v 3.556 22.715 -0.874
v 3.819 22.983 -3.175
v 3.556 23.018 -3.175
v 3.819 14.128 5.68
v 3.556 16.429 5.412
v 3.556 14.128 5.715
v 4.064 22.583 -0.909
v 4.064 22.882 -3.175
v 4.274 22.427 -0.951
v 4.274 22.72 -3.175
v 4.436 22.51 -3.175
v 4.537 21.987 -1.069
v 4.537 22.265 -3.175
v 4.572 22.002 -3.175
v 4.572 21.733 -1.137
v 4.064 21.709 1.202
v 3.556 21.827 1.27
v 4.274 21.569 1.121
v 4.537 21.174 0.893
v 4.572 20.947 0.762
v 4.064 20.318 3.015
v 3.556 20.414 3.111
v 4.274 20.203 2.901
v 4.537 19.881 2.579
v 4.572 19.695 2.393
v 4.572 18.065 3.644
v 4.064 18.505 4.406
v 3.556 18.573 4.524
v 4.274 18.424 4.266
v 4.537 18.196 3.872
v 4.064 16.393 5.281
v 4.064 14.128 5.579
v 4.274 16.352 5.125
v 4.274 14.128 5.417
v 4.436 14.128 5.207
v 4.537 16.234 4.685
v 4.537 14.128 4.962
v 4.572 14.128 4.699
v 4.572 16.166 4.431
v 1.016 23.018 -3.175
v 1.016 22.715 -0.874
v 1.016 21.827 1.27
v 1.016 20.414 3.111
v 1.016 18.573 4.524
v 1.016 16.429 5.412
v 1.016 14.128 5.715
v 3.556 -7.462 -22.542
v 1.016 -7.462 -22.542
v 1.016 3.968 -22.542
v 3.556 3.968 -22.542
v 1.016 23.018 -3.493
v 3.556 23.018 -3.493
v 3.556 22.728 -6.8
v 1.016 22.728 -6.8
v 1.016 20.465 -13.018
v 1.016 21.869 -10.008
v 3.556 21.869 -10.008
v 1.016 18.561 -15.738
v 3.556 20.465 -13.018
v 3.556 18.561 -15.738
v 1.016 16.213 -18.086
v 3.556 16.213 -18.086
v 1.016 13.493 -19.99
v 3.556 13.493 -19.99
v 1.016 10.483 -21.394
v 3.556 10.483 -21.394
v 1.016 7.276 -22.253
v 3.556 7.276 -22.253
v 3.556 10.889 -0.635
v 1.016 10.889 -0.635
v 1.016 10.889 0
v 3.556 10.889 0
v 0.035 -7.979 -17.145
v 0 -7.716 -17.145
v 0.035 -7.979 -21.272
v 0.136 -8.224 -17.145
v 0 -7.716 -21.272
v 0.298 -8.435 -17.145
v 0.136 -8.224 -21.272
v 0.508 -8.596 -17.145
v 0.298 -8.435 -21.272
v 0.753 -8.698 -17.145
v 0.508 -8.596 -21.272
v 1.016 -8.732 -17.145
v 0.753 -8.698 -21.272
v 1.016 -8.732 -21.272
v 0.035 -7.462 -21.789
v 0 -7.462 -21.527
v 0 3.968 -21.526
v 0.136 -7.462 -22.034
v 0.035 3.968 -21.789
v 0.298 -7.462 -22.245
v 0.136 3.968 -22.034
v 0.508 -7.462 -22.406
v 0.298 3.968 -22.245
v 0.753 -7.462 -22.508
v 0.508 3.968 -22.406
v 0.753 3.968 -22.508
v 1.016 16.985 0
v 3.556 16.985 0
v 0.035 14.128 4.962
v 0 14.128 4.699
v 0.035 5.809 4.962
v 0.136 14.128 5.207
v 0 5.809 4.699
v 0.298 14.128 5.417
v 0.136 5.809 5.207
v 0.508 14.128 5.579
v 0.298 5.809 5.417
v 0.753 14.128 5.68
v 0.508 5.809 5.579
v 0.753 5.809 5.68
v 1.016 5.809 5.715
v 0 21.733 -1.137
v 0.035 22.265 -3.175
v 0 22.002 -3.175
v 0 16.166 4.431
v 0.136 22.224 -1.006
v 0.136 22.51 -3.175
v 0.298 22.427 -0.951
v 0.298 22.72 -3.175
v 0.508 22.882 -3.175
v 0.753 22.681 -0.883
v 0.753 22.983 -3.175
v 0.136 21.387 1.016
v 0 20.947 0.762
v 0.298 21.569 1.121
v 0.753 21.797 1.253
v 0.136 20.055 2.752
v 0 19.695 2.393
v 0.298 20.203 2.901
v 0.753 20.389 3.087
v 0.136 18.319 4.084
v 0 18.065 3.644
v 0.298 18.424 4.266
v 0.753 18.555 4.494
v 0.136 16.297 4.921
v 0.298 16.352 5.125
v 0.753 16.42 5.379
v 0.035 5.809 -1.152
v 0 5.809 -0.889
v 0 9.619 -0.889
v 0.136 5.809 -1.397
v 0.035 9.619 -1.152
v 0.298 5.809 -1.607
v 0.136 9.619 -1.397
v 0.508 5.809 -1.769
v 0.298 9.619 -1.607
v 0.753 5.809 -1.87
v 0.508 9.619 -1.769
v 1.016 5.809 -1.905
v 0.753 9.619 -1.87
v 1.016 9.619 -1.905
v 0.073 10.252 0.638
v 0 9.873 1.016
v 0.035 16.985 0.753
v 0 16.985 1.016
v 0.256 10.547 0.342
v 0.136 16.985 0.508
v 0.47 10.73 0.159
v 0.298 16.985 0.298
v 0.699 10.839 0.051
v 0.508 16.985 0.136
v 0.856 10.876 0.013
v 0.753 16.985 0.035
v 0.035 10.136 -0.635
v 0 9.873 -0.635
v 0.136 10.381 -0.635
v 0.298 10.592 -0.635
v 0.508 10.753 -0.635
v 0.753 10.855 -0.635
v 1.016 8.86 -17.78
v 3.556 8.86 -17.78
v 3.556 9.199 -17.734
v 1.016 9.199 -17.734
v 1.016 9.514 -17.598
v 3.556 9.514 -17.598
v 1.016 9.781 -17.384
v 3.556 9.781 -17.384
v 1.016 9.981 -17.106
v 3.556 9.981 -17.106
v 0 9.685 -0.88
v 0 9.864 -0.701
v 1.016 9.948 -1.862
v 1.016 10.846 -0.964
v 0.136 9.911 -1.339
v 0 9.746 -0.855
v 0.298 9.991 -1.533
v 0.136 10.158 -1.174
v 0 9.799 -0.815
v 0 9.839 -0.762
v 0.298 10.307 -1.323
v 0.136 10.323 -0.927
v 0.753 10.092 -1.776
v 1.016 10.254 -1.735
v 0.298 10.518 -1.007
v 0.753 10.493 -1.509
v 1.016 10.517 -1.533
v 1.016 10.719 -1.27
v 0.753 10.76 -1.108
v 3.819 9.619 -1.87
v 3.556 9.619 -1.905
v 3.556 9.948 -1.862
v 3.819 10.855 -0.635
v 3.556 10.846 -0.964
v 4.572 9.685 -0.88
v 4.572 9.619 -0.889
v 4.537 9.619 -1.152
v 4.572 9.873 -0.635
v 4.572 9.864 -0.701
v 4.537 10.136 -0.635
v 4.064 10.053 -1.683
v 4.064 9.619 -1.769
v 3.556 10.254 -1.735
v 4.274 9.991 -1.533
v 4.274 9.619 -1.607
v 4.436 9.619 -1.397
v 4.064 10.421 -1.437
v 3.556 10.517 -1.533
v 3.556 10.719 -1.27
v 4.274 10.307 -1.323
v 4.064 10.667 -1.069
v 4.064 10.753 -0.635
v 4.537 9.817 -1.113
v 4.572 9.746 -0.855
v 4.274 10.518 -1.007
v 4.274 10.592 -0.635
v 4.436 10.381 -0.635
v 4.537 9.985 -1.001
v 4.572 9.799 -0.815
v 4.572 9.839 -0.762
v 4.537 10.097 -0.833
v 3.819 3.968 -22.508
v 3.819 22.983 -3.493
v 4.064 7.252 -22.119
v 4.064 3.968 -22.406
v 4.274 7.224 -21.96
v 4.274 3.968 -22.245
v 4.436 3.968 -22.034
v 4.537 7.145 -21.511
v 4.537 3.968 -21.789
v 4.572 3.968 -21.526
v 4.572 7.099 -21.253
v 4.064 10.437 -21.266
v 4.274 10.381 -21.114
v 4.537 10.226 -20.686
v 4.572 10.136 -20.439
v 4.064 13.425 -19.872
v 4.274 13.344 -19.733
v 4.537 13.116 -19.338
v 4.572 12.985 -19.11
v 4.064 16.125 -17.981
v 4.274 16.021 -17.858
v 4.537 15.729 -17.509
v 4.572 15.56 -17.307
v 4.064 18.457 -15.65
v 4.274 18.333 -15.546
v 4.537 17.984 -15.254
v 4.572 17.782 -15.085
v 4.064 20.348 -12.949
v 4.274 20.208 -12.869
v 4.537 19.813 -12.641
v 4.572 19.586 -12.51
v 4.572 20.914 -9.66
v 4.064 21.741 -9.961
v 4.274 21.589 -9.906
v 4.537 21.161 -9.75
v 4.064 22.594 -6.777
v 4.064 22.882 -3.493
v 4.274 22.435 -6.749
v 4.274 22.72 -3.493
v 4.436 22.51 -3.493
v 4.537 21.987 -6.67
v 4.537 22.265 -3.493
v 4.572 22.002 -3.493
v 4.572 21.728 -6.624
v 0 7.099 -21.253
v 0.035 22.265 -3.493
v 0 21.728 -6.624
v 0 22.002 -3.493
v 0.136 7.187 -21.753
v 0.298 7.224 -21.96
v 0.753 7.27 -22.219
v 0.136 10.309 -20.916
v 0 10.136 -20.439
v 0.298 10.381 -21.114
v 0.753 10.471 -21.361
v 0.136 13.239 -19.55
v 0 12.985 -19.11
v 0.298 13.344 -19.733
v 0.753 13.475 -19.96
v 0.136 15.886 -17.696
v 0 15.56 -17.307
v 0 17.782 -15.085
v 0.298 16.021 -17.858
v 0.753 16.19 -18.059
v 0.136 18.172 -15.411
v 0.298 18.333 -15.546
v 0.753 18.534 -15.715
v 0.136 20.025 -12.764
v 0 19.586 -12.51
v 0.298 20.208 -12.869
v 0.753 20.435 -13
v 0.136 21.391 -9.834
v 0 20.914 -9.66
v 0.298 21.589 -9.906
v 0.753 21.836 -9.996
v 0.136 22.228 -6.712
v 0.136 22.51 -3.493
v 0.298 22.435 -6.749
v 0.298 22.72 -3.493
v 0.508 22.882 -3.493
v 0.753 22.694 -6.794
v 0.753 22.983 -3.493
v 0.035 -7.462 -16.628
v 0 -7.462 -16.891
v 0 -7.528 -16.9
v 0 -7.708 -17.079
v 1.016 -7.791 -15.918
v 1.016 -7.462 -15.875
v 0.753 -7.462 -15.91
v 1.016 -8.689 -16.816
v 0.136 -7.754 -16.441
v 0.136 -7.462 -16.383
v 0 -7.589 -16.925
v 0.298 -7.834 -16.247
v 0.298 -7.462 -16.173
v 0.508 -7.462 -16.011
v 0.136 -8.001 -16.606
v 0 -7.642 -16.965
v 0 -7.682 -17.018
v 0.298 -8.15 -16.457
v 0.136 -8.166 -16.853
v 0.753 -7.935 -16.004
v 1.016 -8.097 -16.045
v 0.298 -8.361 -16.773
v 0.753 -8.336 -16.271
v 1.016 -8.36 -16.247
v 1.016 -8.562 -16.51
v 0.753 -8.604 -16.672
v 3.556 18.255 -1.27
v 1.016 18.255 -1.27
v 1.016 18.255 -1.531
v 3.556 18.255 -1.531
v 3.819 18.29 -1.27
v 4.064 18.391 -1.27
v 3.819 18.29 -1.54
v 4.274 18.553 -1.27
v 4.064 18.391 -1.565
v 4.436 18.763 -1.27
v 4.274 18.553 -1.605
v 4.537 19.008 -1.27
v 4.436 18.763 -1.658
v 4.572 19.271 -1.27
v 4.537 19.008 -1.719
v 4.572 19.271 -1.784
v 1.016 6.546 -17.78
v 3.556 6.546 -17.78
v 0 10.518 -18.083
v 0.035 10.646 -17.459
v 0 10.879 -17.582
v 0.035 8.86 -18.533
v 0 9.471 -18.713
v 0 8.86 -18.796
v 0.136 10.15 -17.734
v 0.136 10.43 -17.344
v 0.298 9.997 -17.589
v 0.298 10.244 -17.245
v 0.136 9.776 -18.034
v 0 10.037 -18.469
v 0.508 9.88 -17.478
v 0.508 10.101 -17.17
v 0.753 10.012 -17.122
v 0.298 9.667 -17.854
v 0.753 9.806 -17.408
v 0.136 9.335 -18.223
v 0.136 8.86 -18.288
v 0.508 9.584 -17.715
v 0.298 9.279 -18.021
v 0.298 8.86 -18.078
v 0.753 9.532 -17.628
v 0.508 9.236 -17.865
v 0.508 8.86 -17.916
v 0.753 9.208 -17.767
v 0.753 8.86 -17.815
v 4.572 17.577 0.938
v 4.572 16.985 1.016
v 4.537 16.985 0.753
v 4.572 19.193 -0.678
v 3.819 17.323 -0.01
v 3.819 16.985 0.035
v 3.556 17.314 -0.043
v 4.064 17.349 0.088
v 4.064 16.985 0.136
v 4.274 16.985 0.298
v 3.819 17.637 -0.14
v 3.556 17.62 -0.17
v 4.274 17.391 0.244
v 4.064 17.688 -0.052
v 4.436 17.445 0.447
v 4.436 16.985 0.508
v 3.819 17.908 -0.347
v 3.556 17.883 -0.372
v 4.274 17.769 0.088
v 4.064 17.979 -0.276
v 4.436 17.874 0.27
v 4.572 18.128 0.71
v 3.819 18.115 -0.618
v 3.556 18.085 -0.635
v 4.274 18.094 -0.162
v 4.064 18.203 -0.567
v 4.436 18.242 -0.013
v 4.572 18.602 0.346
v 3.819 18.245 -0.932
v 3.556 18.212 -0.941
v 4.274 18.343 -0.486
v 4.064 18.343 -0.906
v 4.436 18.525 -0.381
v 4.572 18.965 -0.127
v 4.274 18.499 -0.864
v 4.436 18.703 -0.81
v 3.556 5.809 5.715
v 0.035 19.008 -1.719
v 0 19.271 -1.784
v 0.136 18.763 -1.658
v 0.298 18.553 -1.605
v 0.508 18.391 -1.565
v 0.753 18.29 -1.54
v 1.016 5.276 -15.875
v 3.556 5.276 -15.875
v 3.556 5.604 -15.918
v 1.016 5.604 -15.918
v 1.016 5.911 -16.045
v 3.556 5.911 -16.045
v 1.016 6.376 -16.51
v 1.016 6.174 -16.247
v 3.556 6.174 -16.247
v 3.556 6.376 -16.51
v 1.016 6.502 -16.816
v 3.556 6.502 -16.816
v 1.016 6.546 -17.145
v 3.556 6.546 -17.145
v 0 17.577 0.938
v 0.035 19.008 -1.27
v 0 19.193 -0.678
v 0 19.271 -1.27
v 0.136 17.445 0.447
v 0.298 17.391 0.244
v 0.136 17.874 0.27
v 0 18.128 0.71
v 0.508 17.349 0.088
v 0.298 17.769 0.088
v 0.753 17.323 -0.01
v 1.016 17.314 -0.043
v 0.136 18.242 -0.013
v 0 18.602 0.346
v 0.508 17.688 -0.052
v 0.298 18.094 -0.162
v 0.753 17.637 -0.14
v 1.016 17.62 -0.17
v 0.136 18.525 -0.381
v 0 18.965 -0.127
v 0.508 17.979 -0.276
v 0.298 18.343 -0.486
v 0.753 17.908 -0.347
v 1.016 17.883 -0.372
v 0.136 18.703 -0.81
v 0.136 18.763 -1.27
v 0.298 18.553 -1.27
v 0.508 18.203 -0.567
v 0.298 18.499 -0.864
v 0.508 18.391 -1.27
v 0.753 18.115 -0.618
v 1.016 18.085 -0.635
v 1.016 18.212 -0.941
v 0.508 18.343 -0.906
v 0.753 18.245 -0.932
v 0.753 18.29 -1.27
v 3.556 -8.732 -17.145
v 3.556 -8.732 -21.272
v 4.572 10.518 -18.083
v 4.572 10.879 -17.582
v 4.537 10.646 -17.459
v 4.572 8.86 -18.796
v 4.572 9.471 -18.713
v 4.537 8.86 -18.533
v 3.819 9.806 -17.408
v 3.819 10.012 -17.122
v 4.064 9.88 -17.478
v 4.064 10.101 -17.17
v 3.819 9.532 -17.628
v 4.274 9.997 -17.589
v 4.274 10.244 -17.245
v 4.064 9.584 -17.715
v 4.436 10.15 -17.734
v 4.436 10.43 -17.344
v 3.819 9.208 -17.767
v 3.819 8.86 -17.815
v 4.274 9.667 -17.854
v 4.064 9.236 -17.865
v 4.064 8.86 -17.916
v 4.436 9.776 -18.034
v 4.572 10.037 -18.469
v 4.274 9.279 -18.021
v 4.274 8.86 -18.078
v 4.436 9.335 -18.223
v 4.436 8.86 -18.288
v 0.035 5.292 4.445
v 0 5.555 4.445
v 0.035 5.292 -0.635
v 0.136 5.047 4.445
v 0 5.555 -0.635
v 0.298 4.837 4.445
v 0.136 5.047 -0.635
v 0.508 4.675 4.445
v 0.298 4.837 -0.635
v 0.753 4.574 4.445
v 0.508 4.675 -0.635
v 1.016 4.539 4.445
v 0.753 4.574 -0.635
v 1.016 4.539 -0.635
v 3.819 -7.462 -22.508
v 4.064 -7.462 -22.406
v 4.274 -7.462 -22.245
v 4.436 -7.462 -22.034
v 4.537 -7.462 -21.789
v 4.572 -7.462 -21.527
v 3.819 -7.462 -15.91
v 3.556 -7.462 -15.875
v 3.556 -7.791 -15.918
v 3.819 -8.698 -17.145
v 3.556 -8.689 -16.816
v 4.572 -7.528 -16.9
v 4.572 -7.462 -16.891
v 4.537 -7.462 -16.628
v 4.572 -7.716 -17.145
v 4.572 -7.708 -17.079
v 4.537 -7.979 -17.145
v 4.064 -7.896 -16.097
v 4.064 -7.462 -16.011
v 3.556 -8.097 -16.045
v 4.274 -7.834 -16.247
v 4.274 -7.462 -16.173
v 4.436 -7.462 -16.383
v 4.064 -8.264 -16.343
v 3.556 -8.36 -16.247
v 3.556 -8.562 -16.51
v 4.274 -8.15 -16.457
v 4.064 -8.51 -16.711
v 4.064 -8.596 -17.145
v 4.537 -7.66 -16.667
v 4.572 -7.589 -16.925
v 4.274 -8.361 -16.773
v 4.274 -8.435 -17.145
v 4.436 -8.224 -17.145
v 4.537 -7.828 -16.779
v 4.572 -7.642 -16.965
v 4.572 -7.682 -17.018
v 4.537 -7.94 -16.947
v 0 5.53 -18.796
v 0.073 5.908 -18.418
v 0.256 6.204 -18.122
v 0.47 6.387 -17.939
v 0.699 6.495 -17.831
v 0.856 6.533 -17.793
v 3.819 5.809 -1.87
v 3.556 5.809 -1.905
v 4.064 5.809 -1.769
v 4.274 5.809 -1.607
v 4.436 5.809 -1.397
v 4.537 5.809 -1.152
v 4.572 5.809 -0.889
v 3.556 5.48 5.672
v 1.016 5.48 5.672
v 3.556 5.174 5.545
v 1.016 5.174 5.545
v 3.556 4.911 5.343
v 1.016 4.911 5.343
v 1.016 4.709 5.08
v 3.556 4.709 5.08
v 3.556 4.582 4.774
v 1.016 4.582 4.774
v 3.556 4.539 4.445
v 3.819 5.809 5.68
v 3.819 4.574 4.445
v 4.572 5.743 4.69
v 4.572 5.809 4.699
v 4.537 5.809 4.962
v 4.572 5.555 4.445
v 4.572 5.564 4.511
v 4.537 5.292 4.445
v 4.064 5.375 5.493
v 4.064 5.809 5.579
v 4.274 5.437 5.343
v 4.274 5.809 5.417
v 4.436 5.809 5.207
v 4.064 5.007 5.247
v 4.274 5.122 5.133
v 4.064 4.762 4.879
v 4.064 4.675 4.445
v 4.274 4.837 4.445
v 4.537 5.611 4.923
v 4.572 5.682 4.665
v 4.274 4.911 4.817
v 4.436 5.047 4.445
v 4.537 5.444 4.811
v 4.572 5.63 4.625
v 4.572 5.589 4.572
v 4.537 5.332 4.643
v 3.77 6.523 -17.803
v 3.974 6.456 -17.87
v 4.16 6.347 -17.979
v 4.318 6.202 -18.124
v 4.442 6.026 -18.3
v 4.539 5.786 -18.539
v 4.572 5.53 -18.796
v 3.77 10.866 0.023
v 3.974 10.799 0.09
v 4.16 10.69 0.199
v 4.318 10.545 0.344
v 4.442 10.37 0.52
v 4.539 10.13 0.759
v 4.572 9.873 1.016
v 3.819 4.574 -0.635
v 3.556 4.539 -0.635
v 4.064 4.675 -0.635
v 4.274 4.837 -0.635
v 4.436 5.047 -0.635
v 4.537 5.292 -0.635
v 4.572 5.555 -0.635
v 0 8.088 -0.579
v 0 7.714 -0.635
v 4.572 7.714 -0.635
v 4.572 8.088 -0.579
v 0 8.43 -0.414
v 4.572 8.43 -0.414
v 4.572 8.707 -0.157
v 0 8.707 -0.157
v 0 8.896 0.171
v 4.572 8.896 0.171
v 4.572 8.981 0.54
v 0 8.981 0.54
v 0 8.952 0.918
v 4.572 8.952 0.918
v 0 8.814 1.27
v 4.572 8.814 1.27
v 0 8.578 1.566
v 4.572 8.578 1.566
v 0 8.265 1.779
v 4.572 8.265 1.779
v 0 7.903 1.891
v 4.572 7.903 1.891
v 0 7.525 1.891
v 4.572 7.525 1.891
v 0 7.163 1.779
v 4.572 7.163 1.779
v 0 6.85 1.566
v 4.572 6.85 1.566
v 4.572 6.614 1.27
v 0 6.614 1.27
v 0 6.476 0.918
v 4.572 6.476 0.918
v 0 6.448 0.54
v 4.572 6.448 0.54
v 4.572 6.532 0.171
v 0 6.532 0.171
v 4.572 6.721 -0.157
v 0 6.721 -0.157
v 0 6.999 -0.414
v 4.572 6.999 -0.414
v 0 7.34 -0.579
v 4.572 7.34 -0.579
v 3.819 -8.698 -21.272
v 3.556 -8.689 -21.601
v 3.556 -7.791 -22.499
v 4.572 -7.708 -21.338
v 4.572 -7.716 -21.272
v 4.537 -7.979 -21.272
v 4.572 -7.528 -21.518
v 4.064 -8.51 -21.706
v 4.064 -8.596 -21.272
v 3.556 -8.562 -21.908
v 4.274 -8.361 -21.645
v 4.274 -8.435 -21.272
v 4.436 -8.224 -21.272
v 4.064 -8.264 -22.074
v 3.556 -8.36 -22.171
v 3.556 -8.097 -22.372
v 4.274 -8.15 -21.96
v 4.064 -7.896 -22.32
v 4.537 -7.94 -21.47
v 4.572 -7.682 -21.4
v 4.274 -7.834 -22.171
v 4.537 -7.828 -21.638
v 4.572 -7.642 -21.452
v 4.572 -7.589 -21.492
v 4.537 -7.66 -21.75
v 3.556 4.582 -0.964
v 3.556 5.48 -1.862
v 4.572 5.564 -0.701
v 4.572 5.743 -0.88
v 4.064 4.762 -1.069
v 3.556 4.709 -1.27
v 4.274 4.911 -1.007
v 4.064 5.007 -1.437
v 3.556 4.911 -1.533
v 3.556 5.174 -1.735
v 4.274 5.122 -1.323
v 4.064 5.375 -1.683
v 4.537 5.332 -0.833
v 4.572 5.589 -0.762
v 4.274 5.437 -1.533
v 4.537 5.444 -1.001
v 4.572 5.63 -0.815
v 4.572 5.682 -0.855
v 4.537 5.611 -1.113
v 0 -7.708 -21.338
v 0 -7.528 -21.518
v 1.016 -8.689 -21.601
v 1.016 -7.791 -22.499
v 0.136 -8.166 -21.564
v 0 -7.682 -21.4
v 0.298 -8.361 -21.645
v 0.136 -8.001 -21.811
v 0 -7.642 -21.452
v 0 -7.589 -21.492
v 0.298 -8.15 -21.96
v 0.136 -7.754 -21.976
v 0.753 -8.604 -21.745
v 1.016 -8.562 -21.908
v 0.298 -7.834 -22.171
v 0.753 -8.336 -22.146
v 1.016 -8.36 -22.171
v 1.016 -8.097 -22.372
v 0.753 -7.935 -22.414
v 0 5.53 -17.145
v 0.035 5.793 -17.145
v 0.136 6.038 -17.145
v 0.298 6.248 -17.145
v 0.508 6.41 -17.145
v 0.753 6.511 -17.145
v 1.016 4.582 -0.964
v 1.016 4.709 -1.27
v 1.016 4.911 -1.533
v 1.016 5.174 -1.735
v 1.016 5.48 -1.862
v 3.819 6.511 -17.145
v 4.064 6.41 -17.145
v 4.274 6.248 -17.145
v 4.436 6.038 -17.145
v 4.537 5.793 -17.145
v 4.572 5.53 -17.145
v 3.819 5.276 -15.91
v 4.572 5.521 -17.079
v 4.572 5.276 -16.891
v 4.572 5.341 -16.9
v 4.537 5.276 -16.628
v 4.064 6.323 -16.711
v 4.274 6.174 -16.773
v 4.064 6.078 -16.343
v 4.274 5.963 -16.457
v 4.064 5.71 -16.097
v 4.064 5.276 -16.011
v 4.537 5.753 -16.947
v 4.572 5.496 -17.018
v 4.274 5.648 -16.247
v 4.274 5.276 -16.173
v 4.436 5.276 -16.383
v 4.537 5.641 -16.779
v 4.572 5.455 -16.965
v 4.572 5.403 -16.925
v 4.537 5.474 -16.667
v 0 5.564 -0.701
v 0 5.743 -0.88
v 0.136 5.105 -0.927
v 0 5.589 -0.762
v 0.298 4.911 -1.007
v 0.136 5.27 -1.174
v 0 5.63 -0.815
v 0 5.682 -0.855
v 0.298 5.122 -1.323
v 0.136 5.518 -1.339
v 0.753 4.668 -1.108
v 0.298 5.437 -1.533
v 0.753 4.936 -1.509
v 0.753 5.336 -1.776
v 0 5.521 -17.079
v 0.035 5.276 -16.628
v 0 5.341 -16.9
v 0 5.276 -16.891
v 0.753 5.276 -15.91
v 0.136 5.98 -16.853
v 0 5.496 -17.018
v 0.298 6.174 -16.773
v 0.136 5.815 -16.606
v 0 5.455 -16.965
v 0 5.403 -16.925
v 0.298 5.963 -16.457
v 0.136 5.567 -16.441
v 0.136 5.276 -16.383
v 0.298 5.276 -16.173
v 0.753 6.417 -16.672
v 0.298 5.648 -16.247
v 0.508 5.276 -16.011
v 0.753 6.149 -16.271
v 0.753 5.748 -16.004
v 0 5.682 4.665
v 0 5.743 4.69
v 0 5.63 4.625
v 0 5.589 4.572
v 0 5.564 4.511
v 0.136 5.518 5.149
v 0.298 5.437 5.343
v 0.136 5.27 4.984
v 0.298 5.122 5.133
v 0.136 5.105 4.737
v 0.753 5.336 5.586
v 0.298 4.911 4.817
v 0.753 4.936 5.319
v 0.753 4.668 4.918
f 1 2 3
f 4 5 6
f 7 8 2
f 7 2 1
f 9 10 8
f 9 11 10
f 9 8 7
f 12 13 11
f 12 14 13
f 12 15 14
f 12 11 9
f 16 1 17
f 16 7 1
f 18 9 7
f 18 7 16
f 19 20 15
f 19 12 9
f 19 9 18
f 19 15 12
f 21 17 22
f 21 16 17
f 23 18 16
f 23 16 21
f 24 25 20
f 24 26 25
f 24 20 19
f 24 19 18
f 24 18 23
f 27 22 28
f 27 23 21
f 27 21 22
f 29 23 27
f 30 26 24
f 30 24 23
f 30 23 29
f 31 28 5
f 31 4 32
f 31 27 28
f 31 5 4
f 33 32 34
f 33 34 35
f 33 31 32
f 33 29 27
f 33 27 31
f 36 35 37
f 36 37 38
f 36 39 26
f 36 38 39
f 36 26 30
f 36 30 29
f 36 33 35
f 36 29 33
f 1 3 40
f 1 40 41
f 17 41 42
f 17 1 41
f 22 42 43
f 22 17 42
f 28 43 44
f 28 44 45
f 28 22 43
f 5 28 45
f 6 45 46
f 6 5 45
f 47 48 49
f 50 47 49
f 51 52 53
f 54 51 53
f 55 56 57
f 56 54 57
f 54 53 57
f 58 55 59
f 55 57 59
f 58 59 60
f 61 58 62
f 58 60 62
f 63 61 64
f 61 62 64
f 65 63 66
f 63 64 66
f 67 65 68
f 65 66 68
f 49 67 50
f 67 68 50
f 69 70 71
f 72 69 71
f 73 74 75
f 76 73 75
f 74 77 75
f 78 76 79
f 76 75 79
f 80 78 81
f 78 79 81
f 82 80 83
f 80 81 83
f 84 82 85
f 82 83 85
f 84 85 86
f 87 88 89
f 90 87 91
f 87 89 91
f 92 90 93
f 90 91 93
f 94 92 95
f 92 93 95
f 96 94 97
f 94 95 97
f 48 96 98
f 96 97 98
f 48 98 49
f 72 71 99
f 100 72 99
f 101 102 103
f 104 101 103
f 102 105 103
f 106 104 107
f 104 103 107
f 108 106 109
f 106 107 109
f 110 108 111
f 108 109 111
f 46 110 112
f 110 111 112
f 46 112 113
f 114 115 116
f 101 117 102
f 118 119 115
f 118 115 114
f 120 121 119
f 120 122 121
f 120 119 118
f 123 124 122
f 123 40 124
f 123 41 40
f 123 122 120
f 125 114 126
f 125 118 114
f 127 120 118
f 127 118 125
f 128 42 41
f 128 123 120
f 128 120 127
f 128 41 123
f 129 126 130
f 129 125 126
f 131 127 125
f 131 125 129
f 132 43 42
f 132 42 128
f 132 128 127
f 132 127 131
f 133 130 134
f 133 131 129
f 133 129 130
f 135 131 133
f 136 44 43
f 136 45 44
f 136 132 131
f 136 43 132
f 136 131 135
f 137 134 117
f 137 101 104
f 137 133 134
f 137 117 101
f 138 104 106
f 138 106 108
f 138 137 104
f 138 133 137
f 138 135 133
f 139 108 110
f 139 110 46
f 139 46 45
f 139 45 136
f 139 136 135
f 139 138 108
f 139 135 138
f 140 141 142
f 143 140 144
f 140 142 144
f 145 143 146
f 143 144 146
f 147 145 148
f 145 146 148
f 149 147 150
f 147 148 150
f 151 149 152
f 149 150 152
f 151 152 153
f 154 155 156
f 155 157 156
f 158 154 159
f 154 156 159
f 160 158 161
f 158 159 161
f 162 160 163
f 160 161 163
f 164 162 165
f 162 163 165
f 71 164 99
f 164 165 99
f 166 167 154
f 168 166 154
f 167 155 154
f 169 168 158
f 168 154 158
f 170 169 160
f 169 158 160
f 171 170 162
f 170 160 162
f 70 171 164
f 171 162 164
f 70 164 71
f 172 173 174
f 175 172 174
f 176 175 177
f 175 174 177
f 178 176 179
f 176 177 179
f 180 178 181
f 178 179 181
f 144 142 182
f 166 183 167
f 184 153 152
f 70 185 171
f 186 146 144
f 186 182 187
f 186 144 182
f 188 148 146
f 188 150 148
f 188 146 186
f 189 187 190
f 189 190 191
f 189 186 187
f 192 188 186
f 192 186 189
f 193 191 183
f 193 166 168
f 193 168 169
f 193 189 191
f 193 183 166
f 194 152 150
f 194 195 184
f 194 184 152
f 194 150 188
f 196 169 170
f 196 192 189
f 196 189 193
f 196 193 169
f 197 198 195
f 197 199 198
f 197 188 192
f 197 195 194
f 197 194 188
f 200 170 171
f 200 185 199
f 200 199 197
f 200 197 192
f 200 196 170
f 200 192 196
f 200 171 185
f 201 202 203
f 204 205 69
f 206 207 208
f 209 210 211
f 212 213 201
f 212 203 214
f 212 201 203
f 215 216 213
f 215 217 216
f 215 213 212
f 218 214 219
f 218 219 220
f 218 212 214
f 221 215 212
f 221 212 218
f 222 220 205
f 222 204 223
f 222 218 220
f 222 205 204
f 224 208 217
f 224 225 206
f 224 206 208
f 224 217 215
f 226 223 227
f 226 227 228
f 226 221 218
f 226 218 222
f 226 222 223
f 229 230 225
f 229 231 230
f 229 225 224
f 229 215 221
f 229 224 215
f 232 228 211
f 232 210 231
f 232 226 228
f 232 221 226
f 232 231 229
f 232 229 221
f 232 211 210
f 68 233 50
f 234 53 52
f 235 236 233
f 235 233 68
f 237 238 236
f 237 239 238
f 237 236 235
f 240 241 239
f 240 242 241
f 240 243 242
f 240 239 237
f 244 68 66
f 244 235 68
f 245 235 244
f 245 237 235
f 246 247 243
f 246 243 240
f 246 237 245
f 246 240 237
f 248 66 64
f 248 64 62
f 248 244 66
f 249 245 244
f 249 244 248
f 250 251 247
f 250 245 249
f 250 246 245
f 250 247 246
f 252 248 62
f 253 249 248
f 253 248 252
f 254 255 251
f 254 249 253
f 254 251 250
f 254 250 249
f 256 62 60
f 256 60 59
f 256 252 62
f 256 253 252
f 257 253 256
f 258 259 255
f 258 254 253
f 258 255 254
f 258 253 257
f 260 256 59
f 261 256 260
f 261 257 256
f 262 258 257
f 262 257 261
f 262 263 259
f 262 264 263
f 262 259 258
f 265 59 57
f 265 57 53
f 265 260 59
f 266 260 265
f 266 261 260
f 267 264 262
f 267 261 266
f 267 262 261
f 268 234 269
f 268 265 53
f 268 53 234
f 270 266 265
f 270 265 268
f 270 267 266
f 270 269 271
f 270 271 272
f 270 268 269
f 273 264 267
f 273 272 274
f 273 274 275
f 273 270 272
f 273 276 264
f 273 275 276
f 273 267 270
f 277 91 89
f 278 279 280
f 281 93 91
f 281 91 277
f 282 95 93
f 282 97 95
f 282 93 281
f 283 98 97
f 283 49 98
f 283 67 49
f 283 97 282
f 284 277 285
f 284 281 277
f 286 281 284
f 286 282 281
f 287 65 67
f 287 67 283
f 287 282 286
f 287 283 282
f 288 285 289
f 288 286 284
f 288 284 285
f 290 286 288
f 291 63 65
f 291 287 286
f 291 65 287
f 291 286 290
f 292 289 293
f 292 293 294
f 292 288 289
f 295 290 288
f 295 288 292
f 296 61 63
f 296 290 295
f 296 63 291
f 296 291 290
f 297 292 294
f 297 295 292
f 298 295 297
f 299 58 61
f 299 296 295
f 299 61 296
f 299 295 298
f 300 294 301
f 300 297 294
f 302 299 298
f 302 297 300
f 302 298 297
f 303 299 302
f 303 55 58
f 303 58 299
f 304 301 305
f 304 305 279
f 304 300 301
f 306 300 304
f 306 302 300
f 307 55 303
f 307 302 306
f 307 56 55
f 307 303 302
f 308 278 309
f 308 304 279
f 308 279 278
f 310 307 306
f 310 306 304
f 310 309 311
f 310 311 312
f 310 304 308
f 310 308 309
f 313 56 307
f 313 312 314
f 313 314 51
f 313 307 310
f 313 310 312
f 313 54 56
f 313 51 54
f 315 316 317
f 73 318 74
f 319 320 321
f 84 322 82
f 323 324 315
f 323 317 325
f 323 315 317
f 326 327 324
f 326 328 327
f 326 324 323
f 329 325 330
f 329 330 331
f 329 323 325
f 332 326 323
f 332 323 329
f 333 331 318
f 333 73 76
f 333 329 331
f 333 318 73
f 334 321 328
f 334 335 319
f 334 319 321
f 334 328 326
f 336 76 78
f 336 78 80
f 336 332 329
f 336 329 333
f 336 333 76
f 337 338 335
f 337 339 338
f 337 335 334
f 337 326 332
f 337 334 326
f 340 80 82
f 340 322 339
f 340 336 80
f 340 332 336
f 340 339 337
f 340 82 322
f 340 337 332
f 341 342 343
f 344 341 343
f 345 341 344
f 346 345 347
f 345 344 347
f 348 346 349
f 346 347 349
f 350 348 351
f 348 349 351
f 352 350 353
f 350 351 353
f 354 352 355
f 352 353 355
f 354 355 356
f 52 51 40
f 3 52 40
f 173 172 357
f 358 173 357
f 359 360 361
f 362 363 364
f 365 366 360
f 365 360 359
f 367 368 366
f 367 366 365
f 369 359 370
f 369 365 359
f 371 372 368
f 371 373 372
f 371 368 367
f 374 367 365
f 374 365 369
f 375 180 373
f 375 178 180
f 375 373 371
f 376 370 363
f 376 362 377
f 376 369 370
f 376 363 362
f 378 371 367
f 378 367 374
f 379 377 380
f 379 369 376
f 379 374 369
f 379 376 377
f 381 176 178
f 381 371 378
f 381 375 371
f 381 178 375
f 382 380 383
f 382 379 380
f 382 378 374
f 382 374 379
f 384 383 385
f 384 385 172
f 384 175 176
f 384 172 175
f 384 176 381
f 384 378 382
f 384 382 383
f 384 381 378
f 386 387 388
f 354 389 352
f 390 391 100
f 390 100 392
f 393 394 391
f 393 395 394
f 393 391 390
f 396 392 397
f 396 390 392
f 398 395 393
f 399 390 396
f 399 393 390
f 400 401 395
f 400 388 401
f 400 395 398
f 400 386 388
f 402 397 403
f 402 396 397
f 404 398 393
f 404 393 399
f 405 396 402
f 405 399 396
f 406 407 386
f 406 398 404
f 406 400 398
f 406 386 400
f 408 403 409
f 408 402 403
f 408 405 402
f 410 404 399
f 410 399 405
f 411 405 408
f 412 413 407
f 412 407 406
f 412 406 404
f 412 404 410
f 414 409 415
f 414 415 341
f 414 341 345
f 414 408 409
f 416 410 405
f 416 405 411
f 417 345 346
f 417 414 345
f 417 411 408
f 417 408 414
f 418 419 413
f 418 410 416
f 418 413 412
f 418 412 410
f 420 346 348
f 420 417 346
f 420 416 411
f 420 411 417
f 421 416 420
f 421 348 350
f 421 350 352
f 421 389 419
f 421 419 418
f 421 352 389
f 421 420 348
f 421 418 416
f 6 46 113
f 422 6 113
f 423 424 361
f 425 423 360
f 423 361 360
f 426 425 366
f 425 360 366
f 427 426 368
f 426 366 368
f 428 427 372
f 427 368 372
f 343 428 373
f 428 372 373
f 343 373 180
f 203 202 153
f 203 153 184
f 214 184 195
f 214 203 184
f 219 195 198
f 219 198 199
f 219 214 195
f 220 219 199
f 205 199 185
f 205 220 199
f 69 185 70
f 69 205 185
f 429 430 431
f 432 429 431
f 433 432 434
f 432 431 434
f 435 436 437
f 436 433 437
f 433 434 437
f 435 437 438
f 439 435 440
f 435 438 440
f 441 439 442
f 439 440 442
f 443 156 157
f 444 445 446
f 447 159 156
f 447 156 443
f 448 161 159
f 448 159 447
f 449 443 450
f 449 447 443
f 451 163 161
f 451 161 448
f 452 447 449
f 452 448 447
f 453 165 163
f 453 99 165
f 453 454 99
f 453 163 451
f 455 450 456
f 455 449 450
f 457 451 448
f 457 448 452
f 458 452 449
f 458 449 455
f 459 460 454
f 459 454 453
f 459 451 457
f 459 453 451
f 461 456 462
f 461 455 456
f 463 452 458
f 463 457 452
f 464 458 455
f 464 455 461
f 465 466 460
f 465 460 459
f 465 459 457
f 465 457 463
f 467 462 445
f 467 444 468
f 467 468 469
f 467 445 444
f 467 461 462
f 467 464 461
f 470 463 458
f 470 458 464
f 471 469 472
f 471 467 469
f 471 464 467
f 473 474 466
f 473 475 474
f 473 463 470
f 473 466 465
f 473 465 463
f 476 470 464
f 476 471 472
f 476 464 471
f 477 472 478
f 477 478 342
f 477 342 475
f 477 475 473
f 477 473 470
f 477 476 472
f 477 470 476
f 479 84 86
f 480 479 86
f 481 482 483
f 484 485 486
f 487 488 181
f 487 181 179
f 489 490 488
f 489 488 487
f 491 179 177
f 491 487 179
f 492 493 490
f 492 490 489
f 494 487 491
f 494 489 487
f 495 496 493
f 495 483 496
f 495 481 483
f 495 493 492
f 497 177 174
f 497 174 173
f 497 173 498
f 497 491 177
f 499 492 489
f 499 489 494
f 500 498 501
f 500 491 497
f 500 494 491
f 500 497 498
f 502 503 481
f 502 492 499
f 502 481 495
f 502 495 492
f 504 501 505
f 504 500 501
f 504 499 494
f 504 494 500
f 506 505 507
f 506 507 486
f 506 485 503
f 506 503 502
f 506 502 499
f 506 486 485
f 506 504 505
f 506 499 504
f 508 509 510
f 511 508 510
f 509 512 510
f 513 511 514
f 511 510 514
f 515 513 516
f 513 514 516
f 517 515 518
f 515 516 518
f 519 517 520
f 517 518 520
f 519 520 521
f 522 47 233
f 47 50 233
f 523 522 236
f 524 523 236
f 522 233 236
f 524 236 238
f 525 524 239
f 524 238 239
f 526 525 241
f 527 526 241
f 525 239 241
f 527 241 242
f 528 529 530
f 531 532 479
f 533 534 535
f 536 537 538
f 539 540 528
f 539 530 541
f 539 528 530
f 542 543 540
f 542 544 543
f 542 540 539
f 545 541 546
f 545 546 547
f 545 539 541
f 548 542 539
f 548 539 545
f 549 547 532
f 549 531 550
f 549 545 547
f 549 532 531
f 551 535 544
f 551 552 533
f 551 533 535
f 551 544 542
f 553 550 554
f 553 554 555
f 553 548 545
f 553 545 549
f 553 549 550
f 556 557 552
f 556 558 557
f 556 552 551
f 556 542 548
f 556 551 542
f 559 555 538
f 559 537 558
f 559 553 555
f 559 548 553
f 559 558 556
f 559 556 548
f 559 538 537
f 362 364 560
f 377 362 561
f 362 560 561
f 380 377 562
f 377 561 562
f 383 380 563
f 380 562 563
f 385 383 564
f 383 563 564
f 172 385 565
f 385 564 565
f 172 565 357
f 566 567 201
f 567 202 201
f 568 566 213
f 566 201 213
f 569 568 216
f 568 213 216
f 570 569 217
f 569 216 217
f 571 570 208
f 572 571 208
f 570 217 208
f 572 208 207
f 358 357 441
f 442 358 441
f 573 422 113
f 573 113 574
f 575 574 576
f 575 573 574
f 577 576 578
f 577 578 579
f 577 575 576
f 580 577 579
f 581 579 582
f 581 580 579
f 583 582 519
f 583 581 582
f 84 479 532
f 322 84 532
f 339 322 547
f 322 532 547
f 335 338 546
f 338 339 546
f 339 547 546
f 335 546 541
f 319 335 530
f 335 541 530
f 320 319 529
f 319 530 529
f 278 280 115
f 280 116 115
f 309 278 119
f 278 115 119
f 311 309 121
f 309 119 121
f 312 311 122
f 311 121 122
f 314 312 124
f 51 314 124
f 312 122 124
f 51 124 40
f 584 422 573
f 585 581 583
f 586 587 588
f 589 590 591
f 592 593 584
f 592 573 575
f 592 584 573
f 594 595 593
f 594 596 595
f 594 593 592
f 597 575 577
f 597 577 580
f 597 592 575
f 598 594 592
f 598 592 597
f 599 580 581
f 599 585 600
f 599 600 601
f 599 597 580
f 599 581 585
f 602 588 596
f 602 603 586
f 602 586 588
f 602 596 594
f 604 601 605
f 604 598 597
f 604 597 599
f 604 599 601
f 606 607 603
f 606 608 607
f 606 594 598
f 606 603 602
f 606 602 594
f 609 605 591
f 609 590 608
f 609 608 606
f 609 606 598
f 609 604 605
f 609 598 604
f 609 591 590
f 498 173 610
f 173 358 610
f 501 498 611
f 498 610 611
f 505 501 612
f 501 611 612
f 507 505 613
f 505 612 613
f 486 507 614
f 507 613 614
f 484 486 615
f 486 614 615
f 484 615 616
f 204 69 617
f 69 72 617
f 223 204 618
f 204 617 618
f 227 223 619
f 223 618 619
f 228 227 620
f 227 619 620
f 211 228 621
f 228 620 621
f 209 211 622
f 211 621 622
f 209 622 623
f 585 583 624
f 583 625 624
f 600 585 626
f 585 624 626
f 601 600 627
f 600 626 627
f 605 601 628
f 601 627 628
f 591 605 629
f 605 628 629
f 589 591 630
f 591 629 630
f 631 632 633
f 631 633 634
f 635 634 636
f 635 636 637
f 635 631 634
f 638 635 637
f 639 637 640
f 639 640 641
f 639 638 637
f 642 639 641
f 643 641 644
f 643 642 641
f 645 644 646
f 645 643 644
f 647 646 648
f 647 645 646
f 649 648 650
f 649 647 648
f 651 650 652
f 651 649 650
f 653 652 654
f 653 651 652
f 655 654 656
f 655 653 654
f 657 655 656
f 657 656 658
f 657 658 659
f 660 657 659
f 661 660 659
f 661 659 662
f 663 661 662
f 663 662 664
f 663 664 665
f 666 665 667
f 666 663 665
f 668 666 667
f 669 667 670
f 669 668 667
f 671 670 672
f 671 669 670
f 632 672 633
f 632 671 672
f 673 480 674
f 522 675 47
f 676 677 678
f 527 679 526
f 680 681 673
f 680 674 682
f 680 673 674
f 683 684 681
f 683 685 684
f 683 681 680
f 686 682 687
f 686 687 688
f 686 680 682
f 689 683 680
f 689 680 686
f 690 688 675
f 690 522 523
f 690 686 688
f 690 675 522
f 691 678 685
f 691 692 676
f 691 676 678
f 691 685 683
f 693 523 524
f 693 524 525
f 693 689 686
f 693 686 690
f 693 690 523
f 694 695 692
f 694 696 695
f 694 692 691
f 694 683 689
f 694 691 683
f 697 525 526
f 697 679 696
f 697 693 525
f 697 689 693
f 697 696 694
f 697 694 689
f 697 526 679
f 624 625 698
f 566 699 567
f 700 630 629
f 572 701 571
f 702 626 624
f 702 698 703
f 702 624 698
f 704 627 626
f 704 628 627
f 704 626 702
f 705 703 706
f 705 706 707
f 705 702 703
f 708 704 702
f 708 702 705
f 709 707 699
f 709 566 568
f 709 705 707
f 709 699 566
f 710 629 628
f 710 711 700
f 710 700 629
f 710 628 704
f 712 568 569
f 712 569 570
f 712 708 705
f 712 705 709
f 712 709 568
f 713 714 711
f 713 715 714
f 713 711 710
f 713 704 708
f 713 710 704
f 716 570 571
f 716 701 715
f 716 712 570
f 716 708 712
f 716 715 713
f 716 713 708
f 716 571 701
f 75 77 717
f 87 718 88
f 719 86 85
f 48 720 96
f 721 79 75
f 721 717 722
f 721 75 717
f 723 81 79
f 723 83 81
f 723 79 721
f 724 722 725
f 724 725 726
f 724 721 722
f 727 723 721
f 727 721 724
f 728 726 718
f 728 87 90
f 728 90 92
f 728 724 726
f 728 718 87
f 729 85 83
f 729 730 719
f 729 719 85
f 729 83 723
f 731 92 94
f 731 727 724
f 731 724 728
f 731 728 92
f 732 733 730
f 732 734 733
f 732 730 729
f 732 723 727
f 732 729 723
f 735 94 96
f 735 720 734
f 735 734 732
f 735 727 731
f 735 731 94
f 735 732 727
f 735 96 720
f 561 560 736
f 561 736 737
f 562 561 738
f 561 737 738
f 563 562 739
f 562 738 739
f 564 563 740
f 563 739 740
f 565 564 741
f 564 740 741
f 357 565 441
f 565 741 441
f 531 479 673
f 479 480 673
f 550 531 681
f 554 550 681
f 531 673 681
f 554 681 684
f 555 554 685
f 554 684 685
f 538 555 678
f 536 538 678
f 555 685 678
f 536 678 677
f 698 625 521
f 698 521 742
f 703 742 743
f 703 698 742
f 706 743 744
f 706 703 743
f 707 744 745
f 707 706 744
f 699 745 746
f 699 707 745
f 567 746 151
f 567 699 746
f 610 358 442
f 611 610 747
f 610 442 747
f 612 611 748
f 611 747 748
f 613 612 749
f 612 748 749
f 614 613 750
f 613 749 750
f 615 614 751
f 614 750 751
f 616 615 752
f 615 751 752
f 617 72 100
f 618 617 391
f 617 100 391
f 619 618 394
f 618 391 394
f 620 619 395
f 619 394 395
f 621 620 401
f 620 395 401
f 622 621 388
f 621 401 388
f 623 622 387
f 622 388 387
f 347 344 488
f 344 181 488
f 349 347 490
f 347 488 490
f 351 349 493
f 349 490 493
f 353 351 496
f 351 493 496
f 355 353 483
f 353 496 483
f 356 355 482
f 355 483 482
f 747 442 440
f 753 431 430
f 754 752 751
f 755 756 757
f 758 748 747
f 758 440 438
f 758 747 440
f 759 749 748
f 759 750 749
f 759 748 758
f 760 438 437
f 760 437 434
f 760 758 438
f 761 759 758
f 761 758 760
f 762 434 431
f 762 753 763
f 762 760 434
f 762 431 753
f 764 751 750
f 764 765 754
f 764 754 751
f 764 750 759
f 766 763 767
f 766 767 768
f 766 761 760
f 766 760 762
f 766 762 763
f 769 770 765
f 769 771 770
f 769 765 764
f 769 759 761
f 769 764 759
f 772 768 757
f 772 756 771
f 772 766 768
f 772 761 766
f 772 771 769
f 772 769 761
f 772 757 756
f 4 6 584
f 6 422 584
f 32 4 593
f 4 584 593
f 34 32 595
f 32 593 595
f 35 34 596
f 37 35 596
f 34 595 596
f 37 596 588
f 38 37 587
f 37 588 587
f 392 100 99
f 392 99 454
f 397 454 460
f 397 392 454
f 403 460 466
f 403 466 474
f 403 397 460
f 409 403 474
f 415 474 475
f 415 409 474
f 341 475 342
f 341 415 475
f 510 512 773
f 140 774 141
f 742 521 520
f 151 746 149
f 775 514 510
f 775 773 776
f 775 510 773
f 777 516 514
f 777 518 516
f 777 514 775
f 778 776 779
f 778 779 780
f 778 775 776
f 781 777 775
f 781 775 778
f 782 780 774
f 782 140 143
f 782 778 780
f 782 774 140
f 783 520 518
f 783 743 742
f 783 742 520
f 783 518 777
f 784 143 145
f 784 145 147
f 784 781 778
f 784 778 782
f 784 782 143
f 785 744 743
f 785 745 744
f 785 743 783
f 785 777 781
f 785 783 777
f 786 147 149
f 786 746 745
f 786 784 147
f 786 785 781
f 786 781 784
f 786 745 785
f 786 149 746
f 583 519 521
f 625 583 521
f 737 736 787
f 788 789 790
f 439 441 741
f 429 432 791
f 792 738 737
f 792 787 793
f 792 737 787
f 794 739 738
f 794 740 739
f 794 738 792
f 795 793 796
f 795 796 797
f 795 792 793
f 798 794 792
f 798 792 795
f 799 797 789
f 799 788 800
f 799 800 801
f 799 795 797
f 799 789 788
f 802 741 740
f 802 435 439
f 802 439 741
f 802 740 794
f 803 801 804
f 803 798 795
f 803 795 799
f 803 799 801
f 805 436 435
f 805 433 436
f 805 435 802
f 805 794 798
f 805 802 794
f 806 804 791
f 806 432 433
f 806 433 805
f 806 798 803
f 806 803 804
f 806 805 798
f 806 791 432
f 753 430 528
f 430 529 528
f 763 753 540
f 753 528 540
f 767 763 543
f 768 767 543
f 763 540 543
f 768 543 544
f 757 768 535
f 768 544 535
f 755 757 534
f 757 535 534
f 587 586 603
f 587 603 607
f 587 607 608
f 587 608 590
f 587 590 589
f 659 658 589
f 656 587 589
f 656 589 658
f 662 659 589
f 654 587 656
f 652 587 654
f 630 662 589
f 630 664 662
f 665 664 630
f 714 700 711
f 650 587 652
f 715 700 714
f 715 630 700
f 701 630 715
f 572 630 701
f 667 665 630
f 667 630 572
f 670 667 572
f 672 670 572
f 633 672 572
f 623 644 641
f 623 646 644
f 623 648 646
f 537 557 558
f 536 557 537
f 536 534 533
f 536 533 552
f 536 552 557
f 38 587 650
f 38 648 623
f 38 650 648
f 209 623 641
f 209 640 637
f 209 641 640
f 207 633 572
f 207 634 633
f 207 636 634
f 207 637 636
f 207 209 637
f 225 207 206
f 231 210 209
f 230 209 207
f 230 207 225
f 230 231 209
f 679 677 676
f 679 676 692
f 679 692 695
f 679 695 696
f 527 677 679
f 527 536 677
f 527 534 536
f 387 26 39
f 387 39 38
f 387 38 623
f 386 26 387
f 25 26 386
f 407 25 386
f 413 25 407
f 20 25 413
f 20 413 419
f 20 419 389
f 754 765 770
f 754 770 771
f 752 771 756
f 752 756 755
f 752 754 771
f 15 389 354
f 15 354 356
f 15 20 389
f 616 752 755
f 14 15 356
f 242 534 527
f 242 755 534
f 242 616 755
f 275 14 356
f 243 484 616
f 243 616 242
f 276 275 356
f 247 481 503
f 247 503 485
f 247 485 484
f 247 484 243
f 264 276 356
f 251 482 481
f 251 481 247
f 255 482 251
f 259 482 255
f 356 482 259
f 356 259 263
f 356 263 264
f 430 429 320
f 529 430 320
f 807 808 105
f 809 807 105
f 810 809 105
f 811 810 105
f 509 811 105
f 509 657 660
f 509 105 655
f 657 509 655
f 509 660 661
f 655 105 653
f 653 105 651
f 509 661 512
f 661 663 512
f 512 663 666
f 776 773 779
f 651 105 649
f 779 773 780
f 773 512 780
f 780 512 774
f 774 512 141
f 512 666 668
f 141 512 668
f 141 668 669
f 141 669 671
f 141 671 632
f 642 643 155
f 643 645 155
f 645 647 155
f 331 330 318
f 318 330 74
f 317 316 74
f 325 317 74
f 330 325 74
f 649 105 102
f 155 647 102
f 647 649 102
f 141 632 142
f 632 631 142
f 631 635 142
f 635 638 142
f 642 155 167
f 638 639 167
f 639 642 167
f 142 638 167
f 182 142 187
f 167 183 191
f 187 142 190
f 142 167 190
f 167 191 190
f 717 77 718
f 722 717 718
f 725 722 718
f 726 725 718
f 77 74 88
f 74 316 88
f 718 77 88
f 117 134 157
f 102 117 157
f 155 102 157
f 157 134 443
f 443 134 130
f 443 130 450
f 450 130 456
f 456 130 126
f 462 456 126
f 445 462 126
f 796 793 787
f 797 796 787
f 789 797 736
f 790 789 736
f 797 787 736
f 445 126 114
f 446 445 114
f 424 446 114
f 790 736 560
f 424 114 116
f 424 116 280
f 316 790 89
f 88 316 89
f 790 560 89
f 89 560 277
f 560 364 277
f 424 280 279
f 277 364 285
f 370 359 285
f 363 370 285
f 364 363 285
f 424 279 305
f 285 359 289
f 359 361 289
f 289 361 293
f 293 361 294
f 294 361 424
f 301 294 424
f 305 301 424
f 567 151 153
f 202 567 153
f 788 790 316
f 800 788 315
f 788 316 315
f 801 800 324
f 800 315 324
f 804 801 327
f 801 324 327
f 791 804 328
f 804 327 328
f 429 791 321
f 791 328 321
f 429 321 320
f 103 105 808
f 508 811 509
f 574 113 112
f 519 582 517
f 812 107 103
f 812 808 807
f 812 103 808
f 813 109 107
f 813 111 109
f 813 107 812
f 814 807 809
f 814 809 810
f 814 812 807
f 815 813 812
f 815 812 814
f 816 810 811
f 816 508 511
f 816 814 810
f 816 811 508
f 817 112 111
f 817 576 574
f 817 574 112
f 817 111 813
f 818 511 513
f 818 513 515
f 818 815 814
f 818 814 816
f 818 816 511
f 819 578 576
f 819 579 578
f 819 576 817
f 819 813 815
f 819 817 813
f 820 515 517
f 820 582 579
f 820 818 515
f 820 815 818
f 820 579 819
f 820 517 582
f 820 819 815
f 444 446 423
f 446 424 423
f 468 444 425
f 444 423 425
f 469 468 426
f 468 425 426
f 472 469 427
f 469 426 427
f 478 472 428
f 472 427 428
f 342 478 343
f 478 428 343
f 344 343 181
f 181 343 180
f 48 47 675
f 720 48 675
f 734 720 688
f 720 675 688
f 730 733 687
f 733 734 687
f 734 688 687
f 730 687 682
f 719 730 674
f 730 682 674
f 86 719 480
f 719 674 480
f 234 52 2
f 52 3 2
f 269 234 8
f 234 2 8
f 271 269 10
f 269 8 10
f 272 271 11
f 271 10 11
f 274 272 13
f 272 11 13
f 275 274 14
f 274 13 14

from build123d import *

# Parameters (mm, degrees)
SKETCH1_R           = 1.27
BOSS_EXTRUDE1_DEPTH = 4.572
FILLET4_R           = 1.27
FILLET5_R           = 1.27
FILLET6_R           = 8.89
FILLET7_R           = 19.05
FILLET8_R           = 1.016


with BuildPart() as part:
    # Sketch1 → Boss-Extrude1 (new body)
    with BuildSketch(Plane(origin=(0, 0, 0), x_dir=(0, 0, -1), z_dir=(1, 0, 0))):
        Polygon((-5.715, 23.017636755), (-5.715, 4.539136755), (1.905, 4.539136755), (1.905, 10.889136755), (0, 10.889136755), (0, 18.255136755), (1.531272723, 18.255136755), (17.78, 9.623119465), (17.78, 6.545736755), (15.875, 6.545736755), (15.875, -8.732363245), (22.5425, -8.732363245), (22.5425, 23.017636755), align=None)
        with Locations((-0.635, 7.714136755)):
            Circle(SKETCH1_R, mode=Mode.SUBTRACT)
    extrude(amount=BOSS_EXTRUDE1_DEPTH)

    # Fillet4
    fillet4_edges = [part.edges().sort_by_distance(p)[0] for p in [
        (2.286, 4.539136755, 5.715),
        (2.286, 6.545736755, -15.875),
        (2.286, 10.889136755, -1.905),
        (2.286, 4.539136755, -1.905),
    ]]
    fillet(fillet4_edges, radius=FILLET4_R)

    # Fillet5
    fillet5_edges = [part.edges().sort_by_distance(p)[0] for p in [
        (2.286, -8.732363245, -22.5425),
        (2.286, -8.732363245, -15.875),
        (2.286, 9.623119465, -17.78),
        (2.286, 18.255136755, 0),
    ]]
    fillet(fillet5_edges, radius=FILLET5_R)

    # Fillet6
    fillet6_edges = [part.edges().sort_by_distance(p)[0] for p in [
        (2.286, 23.017636755, 5.715),
    ]]
    fillet(fillet6_edges, radius=FILLET6_R)

    # Fillet7
    fillet7_edges = [part.edges().sort_by_distance(p)[0] for p in [
        (2.286, 23.017636755, -22.5425),
    ]]
    fillet(fillet7_edges, radius=FILLET7_R)

    # Fillet8
    fillet8_edges = [part.edges().sort_by_distance(p)[0] for p in [
        (4.572, 13.937136755, 0),
        (0, 6.545736755, -17.4625),
        (0, 14.118204509, -9.318546725),
        (0, 13.937136755, 0),
        (4.572, 14.118204509, -9.318546725),
        (4.572, 6.545736755, -17.4625),
        (0, -1.093313245, -15.875),
        (4.572, -1.093313245, -15.875),
        (0, 4.539136755, 1.905),
        (0, 10.889136755, -0.3175),
        (0, 7.714136755, -1.905),
        (0, 4.911111143, 5.343025612),
        (0, 4.911111143, -1.533025612),
        (0, 10.517162367, -1.533025612),
        (0, 6.173762367, -16.246974388),
        (4.572, 4.539136755, 1.905),
        (4.572, 7.714136755, -1.905),
        (4.572, 10.889136755, -0.3175),
        (4.572, 4.911111143, 5.343025612),
        (4.572, 4.911111143, -1.533025612),
        (4.572, 10.517162367, -1.533025612),
        (4.572, 6.173762367, -16.246974388),
        (0, 18.255136755, -1.400636361),
        (4.572, 18.255136755, -1.400636361),
        (0, 7.702724325, -17.78),
        (4.572, 7.702724325, -17.78),
        (0, -1.747363245, -22.5425),
        (4.572, -1.747363245, -22.5425),
        (0, -8.732363245, -19.20875),
        (0, -8.360388857, -16.246974388),
        (0, -8.360388857, -22.170525612),
        (4.572, -8.732363245, -19.20875),
        (4.572, -8.360388857, -16.246974388),
        (4.572, -8.360388857, -22.170525612),
        (0, 17.883162367, -0.371974388),
        (4.572, 17.883162367, -0.371974388),
        (0, 9.51400834, -17.598483423),
        (4.572, 9.51400834, -17.598483423),
        (0, 9.968386755, 5.715),
        (4.572, 9.968386755, 5.715),
        (0, 20.413816039, 3.111179285),
        (4.572, 20.413816039, 3.111179285),
        (0, 23.017636755, -3.33375),
        (4.572, 23.017636755, -3.33375),
        (0, 17.438020936, -16.962884182),
        (4.572, 17.438020936, -16.962884182),
    ]]
    fillet(fillet8_edges, radius=FILLET8_R)


solid = part.part
